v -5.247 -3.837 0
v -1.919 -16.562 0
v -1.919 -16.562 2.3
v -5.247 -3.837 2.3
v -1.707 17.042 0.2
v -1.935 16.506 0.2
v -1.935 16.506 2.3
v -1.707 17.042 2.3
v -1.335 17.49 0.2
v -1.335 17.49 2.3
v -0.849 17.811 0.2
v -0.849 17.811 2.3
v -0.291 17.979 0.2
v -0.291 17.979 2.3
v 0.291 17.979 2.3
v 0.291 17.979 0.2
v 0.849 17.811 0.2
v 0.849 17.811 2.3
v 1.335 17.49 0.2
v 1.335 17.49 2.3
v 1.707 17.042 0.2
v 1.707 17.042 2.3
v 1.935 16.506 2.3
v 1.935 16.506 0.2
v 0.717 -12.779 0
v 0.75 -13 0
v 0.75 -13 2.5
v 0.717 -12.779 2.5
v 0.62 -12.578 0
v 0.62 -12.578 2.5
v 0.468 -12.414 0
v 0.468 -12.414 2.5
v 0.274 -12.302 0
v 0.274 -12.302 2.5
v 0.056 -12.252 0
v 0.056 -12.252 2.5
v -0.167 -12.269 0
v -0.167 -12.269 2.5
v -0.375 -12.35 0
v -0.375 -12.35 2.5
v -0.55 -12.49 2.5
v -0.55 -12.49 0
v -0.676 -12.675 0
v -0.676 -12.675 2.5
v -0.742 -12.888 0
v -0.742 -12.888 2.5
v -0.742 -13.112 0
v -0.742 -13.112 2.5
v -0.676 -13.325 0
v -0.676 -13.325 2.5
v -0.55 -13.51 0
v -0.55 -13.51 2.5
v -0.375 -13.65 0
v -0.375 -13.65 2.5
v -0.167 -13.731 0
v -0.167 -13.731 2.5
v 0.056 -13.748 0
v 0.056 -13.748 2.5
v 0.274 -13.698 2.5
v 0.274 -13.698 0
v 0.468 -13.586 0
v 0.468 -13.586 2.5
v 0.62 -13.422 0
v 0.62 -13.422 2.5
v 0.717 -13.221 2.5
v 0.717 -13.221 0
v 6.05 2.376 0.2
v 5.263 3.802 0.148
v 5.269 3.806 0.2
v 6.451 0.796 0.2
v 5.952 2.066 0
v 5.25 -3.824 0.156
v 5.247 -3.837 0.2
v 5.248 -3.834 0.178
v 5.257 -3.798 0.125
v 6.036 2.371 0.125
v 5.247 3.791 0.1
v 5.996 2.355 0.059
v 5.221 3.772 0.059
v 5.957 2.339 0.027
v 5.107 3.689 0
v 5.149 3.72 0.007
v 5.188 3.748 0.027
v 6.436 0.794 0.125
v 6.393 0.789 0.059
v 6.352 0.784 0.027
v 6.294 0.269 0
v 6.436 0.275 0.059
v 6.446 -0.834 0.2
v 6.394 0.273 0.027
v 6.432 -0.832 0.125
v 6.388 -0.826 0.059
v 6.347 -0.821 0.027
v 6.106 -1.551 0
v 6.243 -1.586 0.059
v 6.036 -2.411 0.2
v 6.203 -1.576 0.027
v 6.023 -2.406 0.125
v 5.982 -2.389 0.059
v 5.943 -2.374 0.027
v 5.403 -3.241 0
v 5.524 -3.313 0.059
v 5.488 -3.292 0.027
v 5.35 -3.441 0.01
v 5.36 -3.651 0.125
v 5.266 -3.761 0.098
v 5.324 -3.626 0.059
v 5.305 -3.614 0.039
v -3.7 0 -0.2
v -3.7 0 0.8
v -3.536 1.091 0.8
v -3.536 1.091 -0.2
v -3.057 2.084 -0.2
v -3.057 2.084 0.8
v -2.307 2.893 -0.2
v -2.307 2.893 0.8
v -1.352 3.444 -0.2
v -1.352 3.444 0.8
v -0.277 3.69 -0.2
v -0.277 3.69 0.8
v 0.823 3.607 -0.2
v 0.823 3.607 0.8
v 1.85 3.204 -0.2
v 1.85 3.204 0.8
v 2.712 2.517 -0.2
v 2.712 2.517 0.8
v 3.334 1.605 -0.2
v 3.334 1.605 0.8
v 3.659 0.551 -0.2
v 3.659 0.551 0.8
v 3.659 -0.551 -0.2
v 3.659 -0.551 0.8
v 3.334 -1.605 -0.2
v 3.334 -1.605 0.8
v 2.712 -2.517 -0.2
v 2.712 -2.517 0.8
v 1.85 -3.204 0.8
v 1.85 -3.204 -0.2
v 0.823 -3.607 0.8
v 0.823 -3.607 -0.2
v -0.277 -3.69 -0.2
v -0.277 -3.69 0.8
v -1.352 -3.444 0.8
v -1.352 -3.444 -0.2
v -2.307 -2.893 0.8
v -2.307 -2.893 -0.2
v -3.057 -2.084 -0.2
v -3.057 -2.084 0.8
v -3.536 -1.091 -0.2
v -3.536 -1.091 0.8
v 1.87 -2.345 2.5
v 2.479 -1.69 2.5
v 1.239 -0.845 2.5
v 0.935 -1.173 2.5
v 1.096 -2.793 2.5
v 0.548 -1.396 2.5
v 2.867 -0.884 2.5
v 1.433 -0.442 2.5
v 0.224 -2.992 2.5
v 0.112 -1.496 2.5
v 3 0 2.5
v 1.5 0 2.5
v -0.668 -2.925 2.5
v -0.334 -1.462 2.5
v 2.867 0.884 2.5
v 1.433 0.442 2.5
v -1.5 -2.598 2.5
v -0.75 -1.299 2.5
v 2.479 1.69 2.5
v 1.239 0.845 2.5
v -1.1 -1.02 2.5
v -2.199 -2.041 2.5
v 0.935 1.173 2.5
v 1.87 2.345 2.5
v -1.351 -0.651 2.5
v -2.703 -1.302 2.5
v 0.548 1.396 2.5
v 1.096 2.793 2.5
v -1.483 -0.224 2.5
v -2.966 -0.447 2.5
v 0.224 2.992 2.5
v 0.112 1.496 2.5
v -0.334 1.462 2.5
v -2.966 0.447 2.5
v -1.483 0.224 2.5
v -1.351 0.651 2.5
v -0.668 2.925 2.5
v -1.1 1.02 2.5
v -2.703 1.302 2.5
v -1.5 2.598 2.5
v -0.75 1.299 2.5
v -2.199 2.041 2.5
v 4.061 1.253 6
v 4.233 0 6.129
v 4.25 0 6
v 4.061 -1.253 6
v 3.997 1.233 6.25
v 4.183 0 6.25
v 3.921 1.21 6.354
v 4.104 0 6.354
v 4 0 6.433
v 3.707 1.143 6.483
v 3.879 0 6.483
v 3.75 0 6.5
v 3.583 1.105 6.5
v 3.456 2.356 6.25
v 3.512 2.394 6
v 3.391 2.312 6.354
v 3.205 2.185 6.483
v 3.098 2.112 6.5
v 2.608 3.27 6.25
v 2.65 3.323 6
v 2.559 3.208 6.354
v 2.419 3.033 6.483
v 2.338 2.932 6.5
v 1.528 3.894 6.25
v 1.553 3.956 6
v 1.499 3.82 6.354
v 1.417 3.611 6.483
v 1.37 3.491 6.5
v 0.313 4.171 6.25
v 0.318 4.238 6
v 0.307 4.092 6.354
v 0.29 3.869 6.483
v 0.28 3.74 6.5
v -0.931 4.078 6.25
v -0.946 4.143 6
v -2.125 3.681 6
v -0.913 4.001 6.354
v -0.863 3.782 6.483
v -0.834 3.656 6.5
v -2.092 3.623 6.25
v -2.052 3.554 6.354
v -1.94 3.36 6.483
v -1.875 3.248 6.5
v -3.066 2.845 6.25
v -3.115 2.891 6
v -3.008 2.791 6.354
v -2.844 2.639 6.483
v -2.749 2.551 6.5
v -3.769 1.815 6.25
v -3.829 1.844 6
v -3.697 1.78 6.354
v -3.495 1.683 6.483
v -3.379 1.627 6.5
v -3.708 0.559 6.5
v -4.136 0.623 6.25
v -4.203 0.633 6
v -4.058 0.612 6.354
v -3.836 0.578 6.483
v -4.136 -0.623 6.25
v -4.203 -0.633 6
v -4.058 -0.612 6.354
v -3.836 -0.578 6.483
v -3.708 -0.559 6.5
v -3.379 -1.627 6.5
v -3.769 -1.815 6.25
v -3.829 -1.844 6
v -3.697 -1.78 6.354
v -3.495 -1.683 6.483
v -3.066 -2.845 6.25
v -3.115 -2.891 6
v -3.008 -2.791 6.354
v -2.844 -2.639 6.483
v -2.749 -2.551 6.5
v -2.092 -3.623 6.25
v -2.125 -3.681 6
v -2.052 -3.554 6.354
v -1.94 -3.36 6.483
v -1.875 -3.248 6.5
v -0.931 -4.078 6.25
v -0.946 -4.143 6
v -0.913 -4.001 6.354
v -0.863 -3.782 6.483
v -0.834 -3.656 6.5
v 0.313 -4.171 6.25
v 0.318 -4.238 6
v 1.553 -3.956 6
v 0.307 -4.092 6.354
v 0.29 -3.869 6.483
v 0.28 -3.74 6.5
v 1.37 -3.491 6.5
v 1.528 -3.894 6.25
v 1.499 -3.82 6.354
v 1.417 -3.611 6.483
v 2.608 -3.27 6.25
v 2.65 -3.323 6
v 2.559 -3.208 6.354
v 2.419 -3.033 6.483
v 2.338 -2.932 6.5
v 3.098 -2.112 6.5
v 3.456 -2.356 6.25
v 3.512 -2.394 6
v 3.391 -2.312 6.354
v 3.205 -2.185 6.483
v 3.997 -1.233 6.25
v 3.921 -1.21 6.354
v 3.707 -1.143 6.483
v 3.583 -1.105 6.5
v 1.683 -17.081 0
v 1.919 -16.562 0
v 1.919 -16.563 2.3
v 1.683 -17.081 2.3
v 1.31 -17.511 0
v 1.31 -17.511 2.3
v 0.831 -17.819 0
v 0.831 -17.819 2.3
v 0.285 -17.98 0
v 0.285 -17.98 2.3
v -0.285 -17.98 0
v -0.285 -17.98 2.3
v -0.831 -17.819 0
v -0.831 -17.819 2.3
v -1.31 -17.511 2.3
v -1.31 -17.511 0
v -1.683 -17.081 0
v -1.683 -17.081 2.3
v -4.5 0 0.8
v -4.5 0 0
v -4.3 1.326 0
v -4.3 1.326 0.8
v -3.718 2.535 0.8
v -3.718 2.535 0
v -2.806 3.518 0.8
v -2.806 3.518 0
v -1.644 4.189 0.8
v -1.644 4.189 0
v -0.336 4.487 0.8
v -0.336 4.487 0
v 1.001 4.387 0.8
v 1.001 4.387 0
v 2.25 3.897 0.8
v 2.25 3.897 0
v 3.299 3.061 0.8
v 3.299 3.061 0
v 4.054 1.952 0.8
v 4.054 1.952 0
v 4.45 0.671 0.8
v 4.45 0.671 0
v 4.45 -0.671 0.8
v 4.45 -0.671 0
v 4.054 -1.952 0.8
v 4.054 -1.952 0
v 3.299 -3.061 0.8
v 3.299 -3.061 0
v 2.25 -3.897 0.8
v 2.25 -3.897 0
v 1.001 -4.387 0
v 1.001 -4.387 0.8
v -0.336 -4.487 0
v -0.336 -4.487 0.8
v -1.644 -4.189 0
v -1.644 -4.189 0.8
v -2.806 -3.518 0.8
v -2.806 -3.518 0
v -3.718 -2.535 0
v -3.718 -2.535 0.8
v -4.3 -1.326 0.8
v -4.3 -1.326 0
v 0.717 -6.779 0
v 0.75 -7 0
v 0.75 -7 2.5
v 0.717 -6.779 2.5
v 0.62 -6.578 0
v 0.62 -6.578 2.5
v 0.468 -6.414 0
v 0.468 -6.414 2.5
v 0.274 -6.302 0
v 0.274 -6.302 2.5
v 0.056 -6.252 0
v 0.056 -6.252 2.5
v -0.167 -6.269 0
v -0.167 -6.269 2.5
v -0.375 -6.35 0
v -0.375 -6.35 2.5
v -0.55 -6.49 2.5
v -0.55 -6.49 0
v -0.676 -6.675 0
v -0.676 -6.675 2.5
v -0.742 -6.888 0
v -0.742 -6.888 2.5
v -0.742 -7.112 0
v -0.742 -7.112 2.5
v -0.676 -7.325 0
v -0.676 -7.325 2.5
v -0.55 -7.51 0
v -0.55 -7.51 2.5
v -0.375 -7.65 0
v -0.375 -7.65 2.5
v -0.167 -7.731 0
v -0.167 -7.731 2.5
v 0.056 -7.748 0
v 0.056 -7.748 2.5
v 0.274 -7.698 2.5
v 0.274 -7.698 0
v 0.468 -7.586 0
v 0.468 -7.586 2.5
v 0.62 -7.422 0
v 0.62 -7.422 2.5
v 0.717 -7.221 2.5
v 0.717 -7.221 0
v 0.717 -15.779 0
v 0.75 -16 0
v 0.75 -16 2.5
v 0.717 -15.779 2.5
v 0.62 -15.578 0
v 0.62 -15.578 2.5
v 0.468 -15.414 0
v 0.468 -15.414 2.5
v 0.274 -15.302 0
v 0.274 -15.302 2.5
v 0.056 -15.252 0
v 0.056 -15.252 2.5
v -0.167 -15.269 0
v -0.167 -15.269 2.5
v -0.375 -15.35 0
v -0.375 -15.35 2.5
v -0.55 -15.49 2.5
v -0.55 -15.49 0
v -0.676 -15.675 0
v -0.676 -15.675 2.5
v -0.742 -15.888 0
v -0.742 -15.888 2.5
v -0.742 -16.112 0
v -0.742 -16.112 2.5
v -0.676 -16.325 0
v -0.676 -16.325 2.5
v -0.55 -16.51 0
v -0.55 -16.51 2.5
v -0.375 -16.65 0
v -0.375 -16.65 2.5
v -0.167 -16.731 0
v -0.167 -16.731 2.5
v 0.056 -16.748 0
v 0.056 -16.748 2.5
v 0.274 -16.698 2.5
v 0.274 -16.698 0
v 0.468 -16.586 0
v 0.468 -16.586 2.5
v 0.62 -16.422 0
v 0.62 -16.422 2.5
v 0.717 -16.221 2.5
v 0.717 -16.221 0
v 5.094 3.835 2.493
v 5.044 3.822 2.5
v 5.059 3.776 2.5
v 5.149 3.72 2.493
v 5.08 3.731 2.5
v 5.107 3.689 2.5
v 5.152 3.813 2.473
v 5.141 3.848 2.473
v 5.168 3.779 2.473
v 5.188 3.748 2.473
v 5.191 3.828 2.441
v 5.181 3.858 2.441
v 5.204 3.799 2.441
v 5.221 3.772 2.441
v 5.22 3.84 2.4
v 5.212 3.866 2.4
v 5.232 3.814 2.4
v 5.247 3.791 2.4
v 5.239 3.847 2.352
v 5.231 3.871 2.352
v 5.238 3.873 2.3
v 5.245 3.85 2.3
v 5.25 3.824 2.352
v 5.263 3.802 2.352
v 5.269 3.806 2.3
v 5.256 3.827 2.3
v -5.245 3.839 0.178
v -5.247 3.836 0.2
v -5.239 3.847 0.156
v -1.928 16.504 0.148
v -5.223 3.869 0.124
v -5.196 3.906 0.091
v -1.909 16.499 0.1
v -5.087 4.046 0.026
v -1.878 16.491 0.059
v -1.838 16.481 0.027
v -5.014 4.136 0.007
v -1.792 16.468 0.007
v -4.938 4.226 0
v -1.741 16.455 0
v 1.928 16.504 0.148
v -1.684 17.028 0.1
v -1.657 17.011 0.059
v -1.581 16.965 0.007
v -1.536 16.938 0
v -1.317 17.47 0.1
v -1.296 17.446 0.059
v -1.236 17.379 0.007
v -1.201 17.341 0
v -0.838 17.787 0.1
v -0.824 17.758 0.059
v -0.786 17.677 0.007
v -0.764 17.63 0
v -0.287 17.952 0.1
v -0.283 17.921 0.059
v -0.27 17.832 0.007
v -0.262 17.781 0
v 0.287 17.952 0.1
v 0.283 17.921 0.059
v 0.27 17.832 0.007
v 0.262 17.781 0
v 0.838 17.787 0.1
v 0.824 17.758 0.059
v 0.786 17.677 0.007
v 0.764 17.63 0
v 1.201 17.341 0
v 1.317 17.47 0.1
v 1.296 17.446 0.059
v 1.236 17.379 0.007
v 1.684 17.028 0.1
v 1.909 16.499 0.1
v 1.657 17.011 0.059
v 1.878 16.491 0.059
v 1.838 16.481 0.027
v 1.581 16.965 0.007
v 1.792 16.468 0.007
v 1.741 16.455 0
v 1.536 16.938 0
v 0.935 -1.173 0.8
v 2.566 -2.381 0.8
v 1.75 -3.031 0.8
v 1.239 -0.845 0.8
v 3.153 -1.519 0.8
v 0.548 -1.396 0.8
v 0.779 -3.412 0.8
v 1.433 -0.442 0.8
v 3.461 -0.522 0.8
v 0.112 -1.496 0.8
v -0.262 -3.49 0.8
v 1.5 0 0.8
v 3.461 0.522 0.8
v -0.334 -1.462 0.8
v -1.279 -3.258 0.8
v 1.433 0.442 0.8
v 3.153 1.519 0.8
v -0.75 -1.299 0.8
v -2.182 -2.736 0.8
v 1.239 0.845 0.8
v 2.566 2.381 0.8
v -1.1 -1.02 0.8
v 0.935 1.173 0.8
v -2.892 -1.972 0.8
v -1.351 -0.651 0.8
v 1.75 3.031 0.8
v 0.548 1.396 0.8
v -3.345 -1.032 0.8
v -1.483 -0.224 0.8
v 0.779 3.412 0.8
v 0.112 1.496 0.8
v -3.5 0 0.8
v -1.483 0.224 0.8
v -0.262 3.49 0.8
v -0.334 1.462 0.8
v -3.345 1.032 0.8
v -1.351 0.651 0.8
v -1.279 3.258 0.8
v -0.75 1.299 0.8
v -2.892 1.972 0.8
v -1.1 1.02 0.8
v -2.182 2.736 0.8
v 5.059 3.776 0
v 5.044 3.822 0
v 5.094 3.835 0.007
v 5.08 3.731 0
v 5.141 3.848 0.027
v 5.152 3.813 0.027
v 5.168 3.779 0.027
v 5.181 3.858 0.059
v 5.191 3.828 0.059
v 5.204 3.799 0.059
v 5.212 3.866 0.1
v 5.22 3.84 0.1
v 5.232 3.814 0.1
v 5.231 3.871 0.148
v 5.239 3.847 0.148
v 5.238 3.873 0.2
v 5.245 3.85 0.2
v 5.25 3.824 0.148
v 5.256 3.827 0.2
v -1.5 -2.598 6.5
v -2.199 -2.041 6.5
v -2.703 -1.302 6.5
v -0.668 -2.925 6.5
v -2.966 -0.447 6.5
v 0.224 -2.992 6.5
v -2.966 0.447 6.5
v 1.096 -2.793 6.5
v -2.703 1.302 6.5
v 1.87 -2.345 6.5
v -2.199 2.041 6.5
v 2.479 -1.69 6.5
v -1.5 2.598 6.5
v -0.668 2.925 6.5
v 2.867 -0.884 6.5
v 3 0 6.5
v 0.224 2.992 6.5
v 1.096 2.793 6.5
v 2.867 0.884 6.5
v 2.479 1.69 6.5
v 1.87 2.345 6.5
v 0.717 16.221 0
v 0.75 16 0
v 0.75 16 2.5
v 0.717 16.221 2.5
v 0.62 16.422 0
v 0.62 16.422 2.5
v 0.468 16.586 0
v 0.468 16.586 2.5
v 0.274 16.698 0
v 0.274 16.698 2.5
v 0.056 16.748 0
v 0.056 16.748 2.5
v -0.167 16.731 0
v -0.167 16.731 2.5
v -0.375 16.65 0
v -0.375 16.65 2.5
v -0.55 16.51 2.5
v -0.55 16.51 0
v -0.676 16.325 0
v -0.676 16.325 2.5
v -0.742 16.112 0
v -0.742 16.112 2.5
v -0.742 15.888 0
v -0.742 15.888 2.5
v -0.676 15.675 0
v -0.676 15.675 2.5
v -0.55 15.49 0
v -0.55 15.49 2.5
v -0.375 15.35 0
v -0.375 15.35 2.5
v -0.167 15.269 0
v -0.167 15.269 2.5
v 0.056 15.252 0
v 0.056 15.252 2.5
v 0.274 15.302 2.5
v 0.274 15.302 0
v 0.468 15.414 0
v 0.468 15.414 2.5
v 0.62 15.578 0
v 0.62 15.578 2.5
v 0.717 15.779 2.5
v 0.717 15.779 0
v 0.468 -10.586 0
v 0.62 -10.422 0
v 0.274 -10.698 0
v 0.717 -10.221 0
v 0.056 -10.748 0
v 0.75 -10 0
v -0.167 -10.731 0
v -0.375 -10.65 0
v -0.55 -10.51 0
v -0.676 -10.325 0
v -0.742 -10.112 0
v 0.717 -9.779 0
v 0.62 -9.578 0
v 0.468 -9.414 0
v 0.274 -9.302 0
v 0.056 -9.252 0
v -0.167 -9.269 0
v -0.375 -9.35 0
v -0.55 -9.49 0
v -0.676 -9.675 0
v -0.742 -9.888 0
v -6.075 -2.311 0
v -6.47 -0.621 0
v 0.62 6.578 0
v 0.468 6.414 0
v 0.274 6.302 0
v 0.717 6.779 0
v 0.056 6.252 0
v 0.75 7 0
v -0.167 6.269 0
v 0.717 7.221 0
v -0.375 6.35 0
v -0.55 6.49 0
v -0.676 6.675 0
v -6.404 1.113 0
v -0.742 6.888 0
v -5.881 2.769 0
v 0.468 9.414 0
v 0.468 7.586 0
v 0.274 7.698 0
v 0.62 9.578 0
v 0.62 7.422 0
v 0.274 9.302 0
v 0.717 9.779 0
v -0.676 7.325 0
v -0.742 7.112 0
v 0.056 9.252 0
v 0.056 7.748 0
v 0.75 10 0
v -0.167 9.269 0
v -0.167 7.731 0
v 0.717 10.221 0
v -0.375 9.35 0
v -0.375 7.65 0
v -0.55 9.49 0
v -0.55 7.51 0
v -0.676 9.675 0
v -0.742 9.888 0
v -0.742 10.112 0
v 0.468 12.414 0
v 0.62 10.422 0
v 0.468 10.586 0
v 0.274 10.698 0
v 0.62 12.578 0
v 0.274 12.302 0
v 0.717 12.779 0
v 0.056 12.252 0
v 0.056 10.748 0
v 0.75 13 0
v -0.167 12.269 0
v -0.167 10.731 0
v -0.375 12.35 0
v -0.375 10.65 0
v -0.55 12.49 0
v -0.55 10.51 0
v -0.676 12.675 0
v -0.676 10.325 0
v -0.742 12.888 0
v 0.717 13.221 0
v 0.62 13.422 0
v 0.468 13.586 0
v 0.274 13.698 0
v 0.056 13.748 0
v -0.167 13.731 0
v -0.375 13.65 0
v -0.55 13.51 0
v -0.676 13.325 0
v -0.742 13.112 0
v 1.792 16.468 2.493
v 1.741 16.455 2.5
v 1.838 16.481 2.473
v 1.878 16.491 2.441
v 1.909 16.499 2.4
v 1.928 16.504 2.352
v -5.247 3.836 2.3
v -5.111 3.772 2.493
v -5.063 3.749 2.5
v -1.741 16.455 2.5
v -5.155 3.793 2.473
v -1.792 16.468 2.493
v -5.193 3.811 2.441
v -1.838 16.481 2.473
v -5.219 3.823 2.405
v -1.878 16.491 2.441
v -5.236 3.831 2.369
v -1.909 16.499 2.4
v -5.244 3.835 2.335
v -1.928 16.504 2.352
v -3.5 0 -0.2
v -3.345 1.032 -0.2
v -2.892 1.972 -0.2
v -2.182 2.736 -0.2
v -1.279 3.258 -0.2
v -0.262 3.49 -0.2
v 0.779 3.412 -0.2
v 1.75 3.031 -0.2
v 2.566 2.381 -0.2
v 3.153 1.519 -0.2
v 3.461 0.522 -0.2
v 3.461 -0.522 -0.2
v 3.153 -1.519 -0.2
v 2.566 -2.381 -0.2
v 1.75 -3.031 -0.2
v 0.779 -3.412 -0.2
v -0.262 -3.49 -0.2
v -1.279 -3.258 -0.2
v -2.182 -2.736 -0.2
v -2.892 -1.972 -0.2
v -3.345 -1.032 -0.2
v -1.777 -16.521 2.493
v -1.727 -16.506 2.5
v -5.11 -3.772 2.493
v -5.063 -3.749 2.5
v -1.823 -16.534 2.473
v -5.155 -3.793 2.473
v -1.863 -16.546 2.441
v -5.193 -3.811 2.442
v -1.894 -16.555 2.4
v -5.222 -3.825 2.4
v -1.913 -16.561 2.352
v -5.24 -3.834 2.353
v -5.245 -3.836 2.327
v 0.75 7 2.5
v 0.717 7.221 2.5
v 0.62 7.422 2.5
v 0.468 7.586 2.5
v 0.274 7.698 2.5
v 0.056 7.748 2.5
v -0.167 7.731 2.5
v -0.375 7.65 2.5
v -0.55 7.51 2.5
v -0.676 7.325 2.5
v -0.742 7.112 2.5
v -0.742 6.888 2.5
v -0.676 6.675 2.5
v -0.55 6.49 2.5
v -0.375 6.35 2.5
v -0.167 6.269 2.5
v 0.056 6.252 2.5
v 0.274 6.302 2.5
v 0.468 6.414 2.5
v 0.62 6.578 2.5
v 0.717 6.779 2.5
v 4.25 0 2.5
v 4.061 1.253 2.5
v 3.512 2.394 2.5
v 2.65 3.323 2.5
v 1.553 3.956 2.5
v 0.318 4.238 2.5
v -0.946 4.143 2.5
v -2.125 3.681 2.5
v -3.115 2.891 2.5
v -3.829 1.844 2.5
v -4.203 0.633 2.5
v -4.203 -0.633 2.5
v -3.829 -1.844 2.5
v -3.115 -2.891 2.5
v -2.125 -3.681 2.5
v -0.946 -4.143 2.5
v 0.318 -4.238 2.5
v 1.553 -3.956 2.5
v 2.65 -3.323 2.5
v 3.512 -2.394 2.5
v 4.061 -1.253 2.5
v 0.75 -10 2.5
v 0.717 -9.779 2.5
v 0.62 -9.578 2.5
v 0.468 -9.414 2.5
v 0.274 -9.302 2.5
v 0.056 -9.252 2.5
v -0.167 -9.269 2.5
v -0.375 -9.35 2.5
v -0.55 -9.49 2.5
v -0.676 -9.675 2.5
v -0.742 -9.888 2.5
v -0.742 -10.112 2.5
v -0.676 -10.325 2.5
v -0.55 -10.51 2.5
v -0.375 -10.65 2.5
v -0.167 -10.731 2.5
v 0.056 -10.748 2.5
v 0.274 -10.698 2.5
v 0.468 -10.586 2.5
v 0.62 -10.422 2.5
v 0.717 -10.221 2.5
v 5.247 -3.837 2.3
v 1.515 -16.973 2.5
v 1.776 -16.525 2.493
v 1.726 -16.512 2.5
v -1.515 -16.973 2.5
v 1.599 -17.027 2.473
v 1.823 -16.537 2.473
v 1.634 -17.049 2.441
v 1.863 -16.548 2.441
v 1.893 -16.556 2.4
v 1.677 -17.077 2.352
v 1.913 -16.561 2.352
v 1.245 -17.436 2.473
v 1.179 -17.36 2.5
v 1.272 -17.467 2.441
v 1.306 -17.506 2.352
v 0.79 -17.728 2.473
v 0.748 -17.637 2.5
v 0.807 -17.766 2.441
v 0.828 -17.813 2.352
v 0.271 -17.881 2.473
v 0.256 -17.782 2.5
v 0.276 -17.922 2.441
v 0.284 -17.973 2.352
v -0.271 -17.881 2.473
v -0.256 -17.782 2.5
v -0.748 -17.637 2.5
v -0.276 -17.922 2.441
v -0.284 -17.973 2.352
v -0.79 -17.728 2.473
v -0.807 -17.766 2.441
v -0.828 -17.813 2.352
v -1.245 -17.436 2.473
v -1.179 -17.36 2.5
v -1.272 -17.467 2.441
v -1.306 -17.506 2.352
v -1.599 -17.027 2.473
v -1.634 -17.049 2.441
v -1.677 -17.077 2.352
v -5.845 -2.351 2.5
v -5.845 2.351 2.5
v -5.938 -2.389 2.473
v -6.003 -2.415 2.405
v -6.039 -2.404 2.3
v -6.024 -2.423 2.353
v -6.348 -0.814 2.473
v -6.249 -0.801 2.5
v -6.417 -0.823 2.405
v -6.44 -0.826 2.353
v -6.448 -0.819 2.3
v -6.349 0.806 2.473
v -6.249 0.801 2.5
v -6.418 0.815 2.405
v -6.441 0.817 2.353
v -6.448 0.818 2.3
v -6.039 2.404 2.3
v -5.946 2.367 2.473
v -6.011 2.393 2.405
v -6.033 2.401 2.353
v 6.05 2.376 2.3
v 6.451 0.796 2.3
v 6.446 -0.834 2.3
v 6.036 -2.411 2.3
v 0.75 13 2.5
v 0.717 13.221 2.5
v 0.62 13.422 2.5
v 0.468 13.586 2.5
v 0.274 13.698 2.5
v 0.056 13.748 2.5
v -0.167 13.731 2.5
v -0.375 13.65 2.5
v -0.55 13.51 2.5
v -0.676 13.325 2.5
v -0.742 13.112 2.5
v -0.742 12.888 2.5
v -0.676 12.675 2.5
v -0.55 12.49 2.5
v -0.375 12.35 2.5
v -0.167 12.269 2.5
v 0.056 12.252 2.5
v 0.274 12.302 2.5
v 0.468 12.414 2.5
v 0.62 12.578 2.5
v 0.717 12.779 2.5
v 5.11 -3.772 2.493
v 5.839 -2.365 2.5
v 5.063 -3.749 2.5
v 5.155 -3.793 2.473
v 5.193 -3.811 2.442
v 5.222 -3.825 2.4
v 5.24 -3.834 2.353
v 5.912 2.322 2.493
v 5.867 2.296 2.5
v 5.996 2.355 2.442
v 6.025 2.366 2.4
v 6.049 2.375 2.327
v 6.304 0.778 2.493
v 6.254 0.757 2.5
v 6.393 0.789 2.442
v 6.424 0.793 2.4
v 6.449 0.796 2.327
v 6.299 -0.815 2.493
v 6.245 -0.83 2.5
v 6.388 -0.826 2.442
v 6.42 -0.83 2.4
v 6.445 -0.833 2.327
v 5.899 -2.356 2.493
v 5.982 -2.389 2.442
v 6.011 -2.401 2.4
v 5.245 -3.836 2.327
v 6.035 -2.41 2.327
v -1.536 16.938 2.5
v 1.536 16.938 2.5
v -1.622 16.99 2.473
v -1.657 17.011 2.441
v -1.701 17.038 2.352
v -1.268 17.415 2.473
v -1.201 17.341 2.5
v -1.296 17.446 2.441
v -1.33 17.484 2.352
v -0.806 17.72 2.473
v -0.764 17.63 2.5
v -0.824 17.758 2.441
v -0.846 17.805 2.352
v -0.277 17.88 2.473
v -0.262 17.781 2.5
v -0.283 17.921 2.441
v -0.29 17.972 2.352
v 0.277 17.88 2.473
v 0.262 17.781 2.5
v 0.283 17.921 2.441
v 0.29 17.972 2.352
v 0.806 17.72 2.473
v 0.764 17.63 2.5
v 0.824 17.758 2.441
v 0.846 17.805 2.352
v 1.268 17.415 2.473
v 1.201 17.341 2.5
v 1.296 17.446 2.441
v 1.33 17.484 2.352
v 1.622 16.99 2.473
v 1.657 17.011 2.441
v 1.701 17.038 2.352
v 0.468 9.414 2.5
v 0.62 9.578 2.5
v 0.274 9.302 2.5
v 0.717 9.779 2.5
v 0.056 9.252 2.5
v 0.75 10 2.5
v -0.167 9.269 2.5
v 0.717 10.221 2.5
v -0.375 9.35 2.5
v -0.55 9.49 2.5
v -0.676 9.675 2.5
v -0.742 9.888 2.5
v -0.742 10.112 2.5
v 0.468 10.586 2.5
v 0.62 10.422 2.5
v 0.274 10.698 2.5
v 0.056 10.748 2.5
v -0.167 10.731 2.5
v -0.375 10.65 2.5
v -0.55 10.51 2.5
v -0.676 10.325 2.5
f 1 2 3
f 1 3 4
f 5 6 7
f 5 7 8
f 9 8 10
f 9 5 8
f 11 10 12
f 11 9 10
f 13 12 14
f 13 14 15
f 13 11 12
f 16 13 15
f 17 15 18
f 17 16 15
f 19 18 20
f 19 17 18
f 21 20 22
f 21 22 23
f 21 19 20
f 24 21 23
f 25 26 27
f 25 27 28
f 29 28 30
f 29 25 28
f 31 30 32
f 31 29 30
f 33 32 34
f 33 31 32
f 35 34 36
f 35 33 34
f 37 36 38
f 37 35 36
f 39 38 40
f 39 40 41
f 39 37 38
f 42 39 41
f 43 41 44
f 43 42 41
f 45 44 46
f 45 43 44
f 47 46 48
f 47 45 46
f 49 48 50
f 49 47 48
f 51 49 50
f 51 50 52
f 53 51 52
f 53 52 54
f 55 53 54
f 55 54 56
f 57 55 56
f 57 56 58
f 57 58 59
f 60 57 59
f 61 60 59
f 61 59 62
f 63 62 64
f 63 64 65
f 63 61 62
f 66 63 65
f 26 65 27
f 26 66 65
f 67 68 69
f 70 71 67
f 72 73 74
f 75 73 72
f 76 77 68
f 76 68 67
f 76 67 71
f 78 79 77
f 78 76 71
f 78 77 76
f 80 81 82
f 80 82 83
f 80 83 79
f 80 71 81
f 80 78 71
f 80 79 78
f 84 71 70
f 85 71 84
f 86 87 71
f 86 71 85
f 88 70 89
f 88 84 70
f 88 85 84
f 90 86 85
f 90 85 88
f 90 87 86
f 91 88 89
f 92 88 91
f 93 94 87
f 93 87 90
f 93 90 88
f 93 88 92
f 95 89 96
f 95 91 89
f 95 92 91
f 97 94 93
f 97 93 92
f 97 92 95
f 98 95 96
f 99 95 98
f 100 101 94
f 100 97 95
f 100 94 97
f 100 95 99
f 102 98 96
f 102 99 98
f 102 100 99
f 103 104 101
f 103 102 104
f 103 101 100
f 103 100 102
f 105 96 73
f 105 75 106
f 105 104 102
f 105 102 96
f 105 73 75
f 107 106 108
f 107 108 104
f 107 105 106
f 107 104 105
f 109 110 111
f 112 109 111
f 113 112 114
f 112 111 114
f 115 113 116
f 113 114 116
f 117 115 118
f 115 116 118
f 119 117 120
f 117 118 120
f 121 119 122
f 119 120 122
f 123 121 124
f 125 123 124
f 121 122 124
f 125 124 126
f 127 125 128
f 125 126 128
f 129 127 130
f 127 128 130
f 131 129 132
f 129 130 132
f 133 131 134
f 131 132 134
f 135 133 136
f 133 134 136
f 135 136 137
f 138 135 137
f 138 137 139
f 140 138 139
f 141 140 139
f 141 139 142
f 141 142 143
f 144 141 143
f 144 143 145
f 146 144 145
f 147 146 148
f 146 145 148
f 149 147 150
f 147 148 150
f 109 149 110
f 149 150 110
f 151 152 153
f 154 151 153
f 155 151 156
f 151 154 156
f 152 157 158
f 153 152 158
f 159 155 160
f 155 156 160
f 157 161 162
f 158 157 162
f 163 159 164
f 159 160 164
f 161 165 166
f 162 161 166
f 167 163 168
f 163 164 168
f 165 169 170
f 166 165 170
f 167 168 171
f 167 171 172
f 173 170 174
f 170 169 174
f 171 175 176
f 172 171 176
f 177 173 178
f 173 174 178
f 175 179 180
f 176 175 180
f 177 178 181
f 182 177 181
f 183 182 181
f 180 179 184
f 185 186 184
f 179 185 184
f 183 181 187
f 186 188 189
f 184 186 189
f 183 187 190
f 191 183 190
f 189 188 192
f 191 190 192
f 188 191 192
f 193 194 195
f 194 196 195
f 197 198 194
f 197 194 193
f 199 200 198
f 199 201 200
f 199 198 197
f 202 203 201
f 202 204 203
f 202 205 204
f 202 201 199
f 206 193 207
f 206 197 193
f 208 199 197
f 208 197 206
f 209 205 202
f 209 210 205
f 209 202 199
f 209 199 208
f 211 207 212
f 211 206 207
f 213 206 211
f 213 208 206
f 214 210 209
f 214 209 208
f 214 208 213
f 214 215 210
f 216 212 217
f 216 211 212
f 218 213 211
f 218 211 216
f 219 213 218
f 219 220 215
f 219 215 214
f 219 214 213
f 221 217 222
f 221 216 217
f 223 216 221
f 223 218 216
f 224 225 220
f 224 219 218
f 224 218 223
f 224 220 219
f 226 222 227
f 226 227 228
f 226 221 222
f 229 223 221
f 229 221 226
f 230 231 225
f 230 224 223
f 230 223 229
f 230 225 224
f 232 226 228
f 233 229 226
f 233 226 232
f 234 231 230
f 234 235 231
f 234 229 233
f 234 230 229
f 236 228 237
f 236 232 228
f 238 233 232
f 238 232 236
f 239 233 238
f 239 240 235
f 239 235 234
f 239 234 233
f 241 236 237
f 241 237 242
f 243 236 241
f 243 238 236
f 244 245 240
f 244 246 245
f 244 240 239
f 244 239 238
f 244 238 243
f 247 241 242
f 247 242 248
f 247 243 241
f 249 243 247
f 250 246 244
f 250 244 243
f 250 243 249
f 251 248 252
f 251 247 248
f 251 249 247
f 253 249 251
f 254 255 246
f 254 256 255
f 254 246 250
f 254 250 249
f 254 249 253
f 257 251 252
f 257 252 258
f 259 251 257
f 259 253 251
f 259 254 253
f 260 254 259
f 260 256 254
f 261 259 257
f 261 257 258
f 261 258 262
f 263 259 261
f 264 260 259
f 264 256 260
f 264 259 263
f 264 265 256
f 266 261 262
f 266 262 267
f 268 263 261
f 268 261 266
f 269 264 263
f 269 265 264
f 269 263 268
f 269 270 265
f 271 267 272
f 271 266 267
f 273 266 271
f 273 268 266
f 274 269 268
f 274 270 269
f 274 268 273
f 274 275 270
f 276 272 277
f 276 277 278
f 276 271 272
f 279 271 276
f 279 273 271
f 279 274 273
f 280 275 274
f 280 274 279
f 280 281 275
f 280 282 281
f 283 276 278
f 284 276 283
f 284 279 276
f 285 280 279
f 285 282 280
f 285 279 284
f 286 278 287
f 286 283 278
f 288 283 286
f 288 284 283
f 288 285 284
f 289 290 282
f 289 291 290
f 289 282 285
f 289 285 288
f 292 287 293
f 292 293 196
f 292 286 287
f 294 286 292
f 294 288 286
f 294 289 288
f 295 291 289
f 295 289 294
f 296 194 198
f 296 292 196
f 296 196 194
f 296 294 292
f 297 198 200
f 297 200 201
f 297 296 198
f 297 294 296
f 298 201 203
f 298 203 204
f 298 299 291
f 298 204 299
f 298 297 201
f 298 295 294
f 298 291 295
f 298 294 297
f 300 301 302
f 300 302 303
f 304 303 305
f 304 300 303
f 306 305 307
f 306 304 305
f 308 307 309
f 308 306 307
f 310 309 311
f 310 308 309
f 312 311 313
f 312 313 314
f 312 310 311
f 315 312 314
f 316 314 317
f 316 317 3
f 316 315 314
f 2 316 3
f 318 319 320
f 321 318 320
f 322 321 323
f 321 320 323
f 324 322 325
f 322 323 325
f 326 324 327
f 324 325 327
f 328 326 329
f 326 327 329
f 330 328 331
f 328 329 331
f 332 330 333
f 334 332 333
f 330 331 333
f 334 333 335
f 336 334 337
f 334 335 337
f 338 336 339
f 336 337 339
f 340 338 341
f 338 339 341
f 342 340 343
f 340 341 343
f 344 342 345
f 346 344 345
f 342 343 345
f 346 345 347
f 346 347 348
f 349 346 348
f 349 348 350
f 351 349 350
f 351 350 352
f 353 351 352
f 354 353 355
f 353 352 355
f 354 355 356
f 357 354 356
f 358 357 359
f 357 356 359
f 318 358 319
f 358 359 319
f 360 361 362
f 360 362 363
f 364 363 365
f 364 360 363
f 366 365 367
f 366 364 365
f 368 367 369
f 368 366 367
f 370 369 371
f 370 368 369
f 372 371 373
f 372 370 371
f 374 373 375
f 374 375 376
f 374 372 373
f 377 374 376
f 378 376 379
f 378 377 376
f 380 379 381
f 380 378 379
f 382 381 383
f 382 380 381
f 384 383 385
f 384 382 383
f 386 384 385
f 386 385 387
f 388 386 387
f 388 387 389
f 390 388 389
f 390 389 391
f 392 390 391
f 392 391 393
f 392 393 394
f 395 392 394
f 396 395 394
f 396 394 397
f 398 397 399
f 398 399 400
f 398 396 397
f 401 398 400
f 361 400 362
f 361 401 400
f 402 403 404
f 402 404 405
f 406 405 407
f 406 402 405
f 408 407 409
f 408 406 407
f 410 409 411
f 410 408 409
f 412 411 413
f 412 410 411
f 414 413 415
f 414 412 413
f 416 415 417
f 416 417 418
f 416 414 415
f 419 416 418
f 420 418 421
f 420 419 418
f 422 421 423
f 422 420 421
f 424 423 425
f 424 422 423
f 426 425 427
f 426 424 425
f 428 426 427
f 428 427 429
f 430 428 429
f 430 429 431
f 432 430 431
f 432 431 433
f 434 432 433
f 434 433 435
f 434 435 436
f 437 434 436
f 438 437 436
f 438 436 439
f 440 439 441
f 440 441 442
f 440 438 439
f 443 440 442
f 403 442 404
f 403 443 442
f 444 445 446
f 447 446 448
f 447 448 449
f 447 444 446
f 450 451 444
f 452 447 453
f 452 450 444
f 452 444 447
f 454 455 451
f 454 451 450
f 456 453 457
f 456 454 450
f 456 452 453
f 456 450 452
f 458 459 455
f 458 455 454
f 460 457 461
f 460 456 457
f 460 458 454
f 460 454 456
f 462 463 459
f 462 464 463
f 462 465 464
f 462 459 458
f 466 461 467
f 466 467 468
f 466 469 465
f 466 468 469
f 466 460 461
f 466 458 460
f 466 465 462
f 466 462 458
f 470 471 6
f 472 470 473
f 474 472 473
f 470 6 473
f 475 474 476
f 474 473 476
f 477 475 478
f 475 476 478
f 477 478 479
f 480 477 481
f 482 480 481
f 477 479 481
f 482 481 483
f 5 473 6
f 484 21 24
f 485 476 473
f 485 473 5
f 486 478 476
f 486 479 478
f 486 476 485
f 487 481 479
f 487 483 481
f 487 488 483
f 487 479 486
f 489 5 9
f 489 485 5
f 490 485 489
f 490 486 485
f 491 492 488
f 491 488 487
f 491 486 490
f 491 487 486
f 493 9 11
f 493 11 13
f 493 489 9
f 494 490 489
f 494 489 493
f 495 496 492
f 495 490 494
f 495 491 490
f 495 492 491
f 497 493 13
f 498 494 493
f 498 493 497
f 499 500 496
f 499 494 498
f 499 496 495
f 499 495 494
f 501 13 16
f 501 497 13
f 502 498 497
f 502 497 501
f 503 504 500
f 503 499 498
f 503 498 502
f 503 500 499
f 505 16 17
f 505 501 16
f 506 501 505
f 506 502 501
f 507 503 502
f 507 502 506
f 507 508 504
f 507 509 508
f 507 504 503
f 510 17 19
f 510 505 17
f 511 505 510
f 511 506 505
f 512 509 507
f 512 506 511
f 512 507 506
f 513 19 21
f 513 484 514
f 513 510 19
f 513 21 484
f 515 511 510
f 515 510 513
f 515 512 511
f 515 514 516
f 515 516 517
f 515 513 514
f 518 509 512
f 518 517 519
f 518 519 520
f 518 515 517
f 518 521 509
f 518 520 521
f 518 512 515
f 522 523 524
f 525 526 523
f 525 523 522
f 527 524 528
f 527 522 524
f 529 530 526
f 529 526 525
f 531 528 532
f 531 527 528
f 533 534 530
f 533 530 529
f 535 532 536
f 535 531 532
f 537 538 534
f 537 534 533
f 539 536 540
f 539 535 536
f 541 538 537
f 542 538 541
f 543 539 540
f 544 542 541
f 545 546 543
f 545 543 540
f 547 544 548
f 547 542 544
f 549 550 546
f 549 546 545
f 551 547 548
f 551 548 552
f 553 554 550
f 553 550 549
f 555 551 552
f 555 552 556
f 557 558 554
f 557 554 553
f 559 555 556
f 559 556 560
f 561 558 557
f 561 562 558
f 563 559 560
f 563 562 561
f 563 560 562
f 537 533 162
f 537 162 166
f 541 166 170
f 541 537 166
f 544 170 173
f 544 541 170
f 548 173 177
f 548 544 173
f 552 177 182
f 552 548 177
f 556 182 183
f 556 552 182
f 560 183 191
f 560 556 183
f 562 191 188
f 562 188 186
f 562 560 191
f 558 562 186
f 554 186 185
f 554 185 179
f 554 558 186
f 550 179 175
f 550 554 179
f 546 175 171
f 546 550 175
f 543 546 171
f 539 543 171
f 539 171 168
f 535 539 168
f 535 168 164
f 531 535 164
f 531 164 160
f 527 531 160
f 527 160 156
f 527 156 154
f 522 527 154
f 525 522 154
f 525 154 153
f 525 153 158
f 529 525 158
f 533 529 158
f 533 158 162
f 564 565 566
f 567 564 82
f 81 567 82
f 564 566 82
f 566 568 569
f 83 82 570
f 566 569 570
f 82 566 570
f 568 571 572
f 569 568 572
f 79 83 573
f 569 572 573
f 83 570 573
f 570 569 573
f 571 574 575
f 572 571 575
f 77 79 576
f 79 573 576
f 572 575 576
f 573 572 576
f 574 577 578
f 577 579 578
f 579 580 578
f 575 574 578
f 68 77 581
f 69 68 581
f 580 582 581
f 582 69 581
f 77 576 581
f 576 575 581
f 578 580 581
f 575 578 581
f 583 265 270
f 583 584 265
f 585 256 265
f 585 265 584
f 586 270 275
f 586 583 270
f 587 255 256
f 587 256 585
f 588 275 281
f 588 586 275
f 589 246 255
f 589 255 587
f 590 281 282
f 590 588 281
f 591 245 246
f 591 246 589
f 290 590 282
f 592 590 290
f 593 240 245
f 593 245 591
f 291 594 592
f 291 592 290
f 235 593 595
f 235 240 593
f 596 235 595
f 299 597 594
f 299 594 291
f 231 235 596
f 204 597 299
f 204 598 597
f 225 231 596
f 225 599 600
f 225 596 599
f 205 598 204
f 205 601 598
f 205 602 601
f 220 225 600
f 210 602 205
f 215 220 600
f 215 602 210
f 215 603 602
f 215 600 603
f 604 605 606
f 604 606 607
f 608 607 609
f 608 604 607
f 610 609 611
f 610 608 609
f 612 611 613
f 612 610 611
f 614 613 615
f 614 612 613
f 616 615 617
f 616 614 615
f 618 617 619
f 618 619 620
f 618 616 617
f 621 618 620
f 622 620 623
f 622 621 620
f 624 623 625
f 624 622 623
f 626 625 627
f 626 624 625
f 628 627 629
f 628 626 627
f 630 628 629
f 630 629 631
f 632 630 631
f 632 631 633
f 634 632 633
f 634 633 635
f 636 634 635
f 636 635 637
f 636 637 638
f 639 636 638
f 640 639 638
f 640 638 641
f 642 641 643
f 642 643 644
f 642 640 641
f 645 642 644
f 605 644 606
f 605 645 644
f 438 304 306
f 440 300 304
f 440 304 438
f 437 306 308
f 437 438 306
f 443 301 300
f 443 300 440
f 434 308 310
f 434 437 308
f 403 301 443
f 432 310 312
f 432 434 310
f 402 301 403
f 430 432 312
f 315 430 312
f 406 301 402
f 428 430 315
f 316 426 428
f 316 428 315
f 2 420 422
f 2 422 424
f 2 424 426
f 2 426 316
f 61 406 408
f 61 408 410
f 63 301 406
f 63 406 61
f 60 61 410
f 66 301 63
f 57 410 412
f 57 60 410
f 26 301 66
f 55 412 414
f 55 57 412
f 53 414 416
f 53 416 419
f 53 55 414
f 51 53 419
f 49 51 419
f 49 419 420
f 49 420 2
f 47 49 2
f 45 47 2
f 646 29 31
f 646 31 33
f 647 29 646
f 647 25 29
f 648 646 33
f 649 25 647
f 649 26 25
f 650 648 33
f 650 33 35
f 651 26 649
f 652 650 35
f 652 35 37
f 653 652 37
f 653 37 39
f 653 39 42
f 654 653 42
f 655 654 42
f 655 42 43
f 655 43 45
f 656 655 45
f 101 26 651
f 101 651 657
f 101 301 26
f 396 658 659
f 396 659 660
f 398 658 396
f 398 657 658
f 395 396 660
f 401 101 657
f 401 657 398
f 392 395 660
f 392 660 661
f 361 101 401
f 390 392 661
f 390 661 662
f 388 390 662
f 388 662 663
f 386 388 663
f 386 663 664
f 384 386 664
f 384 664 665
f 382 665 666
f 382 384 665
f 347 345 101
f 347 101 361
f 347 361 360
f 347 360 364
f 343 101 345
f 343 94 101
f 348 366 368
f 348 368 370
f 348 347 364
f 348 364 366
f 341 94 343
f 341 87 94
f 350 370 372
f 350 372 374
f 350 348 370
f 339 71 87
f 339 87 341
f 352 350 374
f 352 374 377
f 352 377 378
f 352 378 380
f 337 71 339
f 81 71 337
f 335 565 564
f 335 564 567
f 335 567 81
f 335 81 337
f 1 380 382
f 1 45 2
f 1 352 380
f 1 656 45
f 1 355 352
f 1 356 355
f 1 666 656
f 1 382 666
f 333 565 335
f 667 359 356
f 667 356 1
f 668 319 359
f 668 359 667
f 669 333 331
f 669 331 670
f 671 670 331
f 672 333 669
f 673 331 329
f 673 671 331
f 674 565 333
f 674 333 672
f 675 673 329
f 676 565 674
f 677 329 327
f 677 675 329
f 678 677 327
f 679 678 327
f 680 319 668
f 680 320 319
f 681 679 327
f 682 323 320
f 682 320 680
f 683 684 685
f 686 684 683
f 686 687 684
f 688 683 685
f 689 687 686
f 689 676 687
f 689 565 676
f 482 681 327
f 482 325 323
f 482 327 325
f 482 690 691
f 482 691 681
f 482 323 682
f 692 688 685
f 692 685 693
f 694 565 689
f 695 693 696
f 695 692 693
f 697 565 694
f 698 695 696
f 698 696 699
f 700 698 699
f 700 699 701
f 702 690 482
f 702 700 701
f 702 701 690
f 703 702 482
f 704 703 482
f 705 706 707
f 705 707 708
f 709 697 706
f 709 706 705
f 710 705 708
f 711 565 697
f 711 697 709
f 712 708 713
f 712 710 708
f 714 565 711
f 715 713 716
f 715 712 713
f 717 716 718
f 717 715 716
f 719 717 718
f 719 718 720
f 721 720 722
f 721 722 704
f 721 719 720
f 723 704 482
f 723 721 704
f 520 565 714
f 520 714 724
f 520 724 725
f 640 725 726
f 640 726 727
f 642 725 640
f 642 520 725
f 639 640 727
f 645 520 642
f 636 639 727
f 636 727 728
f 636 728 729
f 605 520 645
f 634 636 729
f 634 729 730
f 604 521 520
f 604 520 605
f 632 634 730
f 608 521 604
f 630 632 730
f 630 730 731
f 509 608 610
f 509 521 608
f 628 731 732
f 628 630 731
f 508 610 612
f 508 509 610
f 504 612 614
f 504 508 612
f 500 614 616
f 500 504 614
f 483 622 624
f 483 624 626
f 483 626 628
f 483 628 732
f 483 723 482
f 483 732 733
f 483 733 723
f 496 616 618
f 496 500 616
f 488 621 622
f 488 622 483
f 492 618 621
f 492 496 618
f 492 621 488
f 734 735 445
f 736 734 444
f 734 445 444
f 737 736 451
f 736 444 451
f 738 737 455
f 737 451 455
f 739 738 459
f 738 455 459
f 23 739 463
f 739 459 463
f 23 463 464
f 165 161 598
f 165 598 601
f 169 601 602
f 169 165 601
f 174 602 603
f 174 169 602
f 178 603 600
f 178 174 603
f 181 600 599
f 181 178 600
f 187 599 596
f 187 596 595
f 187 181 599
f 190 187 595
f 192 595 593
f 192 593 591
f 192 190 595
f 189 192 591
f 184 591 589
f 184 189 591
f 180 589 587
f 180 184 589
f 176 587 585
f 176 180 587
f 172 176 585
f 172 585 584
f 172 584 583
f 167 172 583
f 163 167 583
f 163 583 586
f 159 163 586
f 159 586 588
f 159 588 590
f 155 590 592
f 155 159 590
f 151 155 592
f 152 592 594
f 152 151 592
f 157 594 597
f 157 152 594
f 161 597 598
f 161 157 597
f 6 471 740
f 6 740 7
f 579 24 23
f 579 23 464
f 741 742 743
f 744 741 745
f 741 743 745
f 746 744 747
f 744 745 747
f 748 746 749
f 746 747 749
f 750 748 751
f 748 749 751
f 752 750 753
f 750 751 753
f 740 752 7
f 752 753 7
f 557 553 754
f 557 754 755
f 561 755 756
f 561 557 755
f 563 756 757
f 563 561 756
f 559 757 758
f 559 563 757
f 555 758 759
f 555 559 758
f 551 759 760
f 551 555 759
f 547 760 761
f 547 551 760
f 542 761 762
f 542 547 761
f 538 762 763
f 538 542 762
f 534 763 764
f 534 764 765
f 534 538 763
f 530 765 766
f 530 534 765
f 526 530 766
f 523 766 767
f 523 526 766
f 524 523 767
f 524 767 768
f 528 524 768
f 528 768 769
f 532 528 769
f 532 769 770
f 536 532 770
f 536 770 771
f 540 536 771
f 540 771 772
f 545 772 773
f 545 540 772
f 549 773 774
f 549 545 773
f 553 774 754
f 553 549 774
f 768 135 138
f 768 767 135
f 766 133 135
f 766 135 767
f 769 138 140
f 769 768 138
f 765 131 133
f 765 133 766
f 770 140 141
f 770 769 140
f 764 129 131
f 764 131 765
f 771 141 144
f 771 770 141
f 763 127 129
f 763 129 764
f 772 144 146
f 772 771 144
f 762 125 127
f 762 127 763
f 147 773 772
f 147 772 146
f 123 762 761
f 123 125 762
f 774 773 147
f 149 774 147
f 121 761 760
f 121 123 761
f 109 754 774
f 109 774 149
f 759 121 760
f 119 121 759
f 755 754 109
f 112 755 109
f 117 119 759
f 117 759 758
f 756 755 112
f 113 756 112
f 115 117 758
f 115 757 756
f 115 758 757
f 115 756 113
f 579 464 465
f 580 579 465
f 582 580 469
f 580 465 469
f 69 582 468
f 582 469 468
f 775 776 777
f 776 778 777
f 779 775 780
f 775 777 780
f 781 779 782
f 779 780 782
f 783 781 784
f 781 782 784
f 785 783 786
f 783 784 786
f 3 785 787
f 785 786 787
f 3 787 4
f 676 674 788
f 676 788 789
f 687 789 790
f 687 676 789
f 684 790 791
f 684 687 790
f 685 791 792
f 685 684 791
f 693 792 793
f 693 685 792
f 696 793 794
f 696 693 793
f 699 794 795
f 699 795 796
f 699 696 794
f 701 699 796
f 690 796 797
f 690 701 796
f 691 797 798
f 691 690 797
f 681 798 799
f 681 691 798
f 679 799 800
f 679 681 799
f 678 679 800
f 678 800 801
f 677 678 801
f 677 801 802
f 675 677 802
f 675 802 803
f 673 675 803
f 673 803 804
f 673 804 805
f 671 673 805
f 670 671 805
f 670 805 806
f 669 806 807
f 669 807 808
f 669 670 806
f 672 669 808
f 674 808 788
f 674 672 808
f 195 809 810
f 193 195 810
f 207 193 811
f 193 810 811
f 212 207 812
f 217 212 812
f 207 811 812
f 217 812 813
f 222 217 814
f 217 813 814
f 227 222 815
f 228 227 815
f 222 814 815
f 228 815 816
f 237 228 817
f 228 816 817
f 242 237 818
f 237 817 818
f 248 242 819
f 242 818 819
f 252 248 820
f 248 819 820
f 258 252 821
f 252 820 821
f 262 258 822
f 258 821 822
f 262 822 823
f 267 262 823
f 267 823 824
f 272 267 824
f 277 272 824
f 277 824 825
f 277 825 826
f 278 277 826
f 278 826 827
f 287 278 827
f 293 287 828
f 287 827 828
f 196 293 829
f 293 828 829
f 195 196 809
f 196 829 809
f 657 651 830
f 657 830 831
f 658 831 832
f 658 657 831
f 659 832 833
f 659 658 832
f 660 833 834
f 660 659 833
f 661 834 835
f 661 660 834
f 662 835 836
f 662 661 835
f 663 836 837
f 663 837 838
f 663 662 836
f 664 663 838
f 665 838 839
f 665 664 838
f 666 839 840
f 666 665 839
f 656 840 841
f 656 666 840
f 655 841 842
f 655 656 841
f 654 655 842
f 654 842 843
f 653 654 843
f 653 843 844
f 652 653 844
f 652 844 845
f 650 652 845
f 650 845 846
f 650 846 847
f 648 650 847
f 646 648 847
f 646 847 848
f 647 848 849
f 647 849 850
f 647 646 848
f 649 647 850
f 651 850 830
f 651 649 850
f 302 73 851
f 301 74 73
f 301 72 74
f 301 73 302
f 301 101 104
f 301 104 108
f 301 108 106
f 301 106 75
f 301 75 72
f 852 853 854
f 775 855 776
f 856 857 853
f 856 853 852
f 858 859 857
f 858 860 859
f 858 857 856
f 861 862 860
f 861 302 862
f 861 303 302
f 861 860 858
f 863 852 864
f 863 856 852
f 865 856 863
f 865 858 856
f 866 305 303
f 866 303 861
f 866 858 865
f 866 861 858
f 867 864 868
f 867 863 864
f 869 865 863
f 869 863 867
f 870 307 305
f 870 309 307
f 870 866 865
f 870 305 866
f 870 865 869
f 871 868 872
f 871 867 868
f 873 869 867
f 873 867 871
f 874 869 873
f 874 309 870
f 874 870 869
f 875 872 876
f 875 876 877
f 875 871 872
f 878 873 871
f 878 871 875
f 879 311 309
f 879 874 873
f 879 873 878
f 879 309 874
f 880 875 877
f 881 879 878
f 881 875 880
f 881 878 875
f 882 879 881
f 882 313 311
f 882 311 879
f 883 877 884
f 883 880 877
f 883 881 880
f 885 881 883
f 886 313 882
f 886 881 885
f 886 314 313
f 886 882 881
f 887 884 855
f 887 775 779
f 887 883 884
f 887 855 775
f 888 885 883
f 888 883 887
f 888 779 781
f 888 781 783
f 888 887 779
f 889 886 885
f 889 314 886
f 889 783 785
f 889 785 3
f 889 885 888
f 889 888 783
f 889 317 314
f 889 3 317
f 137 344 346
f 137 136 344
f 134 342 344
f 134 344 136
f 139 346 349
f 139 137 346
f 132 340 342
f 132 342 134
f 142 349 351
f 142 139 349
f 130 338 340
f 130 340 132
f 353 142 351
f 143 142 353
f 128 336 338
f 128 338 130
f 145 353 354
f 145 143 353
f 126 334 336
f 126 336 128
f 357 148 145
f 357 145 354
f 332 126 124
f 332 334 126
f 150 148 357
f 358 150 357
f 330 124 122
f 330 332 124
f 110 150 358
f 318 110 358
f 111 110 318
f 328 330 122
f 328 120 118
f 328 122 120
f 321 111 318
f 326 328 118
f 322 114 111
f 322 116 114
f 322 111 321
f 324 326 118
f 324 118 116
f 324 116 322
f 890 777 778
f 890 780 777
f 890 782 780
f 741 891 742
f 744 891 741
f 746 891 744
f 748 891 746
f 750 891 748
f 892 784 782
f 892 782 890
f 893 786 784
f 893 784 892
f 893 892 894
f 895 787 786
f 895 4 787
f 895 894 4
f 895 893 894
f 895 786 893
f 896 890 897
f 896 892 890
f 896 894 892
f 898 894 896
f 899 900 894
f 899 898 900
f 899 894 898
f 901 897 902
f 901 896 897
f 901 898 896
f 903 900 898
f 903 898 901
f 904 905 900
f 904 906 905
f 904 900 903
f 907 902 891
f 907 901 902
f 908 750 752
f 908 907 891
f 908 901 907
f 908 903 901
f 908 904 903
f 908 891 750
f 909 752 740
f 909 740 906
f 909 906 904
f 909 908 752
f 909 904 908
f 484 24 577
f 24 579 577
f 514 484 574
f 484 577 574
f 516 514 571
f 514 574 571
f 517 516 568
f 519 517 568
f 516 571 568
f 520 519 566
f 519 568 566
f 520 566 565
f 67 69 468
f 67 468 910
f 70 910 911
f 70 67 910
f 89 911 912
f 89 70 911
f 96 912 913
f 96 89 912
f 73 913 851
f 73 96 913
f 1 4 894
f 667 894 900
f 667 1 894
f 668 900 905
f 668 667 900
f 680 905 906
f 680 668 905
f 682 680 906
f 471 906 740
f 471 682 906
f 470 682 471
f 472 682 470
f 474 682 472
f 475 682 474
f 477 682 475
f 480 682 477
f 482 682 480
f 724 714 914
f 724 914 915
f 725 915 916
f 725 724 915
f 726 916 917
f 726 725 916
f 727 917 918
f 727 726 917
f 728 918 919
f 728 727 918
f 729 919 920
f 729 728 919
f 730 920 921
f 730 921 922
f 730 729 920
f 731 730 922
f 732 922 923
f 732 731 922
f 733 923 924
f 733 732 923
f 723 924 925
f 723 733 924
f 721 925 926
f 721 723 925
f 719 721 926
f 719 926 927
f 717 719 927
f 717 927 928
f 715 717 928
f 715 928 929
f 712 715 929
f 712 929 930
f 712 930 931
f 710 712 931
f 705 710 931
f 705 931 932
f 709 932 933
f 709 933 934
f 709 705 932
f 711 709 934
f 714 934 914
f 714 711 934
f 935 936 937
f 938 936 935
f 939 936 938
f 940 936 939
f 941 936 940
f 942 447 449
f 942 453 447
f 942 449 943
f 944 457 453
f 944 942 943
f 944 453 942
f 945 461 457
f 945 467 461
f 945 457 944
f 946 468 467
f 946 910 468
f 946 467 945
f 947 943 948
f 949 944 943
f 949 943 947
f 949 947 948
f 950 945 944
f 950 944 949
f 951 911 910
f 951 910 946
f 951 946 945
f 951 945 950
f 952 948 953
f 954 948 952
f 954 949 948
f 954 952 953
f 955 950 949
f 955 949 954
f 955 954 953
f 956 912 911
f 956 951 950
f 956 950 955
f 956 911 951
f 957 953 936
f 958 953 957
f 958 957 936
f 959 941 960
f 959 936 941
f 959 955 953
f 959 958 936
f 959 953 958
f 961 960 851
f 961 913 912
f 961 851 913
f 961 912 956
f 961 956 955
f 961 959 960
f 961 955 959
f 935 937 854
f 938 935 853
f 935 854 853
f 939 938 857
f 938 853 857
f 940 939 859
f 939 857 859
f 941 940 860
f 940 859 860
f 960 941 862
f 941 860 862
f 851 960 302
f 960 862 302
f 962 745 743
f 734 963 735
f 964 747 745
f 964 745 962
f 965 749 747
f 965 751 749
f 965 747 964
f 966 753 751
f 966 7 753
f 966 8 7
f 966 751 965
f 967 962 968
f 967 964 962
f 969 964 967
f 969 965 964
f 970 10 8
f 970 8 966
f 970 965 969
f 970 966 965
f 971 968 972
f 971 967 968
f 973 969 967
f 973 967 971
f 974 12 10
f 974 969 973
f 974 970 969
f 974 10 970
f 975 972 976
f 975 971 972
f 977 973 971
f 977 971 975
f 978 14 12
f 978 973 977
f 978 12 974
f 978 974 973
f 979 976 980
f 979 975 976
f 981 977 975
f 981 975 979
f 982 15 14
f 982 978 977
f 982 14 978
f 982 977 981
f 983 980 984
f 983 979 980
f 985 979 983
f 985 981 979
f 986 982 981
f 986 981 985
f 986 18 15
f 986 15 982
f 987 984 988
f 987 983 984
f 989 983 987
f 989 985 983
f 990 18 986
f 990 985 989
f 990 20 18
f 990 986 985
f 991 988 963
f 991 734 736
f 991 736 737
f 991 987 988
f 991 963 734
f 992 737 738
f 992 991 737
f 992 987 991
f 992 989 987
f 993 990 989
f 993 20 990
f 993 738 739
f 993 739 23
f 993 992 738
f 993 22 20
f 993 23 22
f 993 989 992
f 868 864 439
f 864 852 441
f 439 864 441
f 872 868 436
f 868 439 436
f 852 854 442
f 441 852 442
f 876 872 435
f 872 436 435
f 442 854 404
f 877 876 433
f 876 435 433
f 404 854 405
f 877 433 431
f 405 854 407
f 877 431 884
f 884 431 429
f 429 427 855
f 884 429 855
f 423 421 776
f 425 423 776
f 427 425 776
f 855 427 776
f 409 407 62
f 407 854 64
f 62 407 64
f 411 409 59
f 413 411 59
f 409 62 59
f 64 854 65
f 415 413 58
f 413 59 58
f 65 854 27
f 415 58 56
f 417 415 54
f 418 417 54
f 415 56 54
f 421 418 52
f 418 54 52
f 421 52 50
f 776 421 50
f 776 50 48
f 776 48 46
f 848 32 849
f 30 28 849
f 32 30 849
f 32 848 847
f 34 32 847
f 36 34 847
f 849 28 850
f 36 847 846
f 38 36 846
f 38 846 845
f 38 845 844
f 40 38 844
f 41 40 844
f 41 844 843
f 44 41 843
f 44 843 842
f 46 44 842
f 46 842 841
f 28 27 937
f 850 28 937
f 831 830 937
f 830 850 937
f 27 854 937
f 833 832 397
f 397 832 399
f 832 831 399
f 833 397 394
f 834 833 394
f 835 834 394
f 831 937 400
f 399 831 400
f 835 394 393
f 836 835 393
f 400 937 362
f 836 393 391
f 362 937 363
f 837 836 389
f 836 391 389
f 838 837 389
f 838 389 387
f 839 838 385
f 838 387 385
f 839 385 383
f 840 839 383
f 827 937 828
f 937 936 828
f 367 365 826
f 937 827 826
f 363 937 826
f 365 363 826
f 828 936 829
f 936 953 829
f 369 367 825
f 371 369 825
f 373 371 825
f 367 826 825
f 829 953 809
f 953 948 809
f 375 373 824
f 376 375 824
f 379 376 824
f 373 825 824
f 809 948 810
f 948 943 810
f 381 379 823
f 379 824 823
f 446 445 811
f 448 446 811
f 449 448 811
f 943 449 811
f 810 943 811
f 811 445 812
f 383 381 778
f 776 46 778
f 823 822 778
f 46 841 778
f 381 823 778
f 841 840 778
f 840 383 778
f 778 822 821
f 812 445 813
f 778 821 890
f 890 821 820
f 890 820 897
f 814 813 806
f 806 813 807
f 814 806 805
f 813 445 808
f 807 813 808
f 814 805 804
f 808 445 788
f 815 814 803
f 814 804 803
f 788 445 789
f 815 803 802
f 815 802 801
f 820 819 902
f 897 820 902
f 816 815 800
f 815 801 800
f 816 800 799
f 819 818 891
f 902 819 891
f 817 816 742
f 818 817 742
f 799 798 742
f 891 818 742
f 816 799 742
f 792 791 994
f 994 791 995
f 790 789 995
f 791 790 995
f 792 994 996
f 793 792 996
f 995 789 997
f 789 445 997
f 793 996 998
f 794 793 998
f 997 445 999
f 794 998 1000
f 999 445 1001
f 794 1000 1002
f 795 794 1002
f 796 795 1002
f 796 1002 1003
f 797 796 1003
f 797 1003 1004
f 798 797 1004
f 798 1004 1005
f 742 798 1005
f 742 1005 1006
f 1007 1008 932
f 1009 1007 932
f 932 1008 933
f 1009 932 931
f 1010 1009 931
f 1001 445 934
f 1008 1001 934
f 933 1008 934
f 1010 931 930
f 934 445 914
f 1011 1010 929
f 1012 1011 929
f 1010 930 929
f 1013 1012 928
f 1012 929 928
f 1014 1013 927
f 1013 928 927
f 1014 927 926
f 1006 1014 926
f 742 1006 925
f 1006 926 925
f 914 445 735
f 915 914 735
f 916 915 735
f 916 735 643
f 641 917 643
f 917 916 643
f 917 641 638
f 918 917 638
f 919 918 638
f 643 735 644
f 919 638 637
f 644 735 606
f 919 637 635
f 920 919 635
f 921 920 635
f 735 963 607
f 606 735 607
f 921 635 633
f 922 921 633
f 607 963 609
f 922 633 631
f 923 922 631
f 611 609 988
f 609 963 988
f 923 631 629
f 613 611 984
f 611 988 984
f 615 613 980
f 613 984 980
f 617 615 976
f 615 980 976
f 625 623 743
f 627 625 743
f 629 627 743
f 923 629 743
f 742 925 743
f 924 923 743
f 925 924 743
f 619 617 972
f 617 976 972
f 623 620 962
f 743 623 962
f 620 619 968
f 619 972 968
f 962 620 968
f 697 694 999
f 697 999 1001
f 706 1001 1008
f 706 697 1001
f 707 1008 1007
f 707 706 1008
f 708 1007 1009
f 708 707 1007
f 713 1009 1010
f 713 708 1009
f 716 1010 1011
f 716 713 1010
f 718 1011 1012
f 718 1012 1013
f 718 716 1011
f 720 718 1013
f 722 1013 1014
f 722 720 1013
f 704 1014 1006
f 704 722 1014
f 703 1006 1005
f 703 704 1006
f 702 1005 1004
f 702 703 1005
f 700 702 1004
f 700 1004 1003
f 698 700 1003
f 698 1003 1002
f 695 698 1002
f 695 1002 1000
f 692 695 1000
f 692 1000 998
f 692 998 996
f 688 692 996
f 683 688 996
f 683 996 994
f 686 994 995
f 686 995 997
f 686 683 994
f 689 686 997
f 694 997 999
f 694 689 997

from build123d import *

# Parameters (mm, degrees)
SKETCH1_R           = 0.75
SKETCH1_R_2         = 1.5
BOSS_EXTRUDE1_DEPTH = 2.5
SKETCH2_R           = 4.25
SKETCH2_R_2         = 3
BOSS_EXTRUDE2_DEPTH = 4
SKETCH3_R           = 4.5
CUT_EXTRUDE1_DEPTH  = 0.8
SKETCH4_R           = 3.7
SKETCH4_R_2         = 3.5
BOSS_EXTRUDE3_DEPTH = 1
FILLET2_R           = 0.5
FILLET3_R           = 0.2


with BuildPart() as part:
    # Sketch1 → Boss-Extrude1 (new body)
    with BuildSketch(Plane.XY):
        with BuildLine():
            Line((1.934972164, 16.505848487), (5.247058111, 3.836454246))
            ThreePointArc((5.247058111, 3.836454246), (6.499999994, -0.000272762), (5.246736111, -3.836894601))
            Line((5.246736111, -3.836894601), (1.919269062, -16.5625))
            ThreePointArc((1.919269062, -16.5625), (0, -17.999999995), (-1.919269062, -16.562499999))
            Line((-1.919269062, -16.562499999), (-5.246736111, -3.836894601))
            ThreePointArc((-5.246736111, -3.836894601), (-6.499999994, -0.000272762), (-5.247058111, 3.836454246))
            Line((-5.247058111, 3.836454246), (-1.934972164, 16.505848487))
            ThreePointArc((-1.934972164, 16.505848487), (0, 17.999999979), (1.934972164, 16.505848487))
        make_face()
        with Locations((0, 7)):
            Circle(SKETCH1_R, mode=Mode.SUBTRACT)
        with Locations((0, 10)):
            Circle(SKETCH1_R, mode=Mode.SUBTRACT)
        with Locations((0, 13)):
            Circle(SKETCH1_R, mode=Mode.SUBTRACT)
        with Locations((0, 16)):
            Circle(SKETCH1_R, mode=Mode.SUBTRACT)
        Circle(SKETCH1_R_2, mode=Mode.SUBTRACT)
        with Locations((0, -16)):
            Circle(SKETCH1_R, mode=Mode.SUBTRACT)
        with Locations((0, -13)):
            Circle(SKETCH1_R, mode=Mode.SUBTRACT)
        with Locations((0, -10)):
            Circle(SKETCH1_R, mode=Mode.SUBTRACT)
        with Locations((0, -7)):
            Circle(SKETCH1_R, mode=Mode.SUBTRACT)
    extrude(amount=BOSS_EXTRUDE1_DEPTH)

    # Sketch2 → Boss-Extrude2 (add)
    with BuildSketch(Plane.XY.offset(2.5)):
        Circle(SKETCH2_R)
        Circle(SKETCH2_R_2, mode=Mode.SUBTRACT)
    extrude(amount=BOSS_EXTRUDE2_DEPTH)

    # Sketch3 → Cut-Extrude1 (cut)
    with BuildSketch(Plane(origin=(0, 0, 0), x_dir=(-1, 0, 0), z_dir=(0, 0, -1))):
        Circle(SKETCH3_R)
    extrude(amount=-CUT_EXTRUDE1_DEPTH, mode=Mode.SUBTRACT)

    # Sketch4 → Boss-Extrude3 (add)
    with BuildSketch(Plane(origin=(0, 0, 0.8), x_dir=(-1, 0, 0), z_dir=(0, 0, -1))):
        Circle(SKETCH4_R)
        Circle(SKETCH4_R_2, mode=Mode.SUBTRACT)
    extrude(amount=BOSS_EXTRUDE3_DEPTH)

    # Fillet2
    fillet2_edges = [part.edges().sort_by_distance(p)[0] for p in [
        (-4.25, 0, 6.5),
    ]]
    fillet(fillet2_edges, radius=FILLET2_R)

    # Fillet3
    fillet3_edges = [part.edges().sort_by_distance(p)[0] for p in [
        (3.583002587, -10.1996973, 2.5),
        (0, -17.999999995, 2.5),
        (-3.583002587, -10.1996973, 2.5),
        (-3.591015137, 10.171151366, 2.5),
        (0, 17.999999979, 2.5),
        (-3.591015137, 10.171151366, 0),
        (0, 17.999999979, 0),
        (3.591015137, 10.171151366, 2.5),
        (3.591015137, 10.171151366, 0),
        (6.499999994, -0.000272762, 2.5),
        (6.499999994, -0.000272762, 0),
        (5.247058111, 3.836454246, 1.25),
        (-6.499999994, -0.000272762, 2.5),
    ]]
    fillet(fillet3_edges, radius=FILLET3_R)


solid = part.part
